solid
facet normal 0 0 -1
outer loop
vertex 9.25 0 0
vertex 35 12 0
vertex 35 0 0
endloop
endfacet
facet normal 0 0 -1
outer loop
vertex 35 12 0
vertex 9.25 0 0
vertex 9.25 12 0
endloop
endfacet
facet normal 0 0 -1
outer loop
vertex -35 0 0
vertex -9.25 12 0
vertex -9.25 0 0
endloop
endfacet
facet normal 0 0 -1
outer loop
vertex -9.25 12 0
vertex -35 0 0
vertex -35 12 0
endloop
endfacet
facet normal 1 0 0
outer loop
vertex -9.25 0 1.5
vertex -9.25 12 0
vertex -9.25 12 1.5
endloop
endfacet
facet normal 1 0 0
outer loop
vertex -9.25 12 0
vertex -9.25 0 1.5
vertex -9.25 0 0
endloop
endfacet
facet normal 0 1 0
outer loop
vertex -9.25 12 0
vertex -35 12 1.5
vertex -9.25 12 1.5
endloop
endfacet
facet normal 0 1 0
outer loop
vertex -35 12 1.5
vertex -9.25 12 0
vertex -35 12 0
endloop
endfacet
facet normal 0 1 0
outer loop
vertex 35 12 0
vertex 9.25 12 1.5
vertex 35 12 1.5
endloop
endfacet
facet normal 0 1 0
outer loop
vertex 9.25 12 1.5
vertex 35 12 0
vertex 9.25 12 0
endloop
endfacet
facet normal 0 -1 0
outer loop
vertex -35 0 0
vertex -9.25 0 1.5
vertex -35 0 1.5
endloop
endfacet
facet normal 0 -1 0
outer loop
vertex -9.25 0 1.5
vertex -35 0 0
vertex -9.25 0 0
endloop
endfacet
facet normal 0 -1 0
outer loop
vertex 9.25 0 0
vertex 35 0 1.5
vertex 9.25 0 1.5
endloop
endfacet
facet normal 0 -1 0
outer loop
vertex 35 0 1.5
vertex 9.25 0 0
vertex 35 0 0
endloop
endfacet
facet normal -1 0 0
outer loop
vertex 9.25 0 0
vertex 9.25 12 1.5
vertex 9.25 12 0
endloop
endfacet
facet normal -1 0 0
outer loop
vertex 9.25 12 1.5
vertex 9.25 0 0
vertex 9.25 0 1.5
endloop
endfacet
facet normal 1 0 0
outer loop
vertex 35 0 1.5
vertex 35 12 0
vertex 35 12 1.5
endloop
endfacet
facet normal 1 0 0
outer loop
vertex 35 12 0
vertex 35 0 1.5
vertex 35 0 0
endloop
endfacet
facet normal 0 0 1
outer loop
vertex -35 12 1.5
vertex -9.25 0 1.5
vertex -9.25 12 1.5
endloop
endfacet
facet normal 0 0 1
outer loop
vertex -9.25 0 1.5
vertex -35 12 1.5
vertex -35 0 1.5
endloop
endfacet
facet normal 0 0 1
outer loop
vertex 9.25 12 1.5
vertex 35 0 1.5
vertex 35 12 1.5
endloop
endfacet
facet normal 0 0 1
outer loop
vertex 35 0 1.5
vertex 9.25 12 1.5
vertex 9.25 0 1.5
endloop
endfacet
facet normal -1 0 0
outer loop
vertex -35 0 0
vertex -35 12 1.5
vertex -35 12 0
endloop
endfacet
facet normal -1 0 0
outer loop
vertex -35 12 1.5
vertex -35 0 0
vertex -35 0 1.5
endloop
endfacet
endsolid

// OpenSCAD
// 10-well comb for casting agarose gels
// Print orientation: flat on bed, teeth pointing down (-Z)

// ---------- Parameters ----------
plate_len    = 70;    // spine length (X)
plate_wid    = 12;    // spine width (Y)
plate_t      = 1.5;   // plate thickness (Z)

tooth_count  = 10;    // number of teeth
tooth_w      = 5.0;   // tooth width (X)
tooth_len    = 12;    // tooth length (Y)
tooth_pitch  = 1.5;   // gap between teeth (X)

eps          = 0.5;   // overcut for clean booleans

$fn = 64;

// ---------- Derived ----------
spine_h = plate_wid + tooth_count * tooth_len + (tooth_count - 1) * tooth_pitch;

// ---------- Model ----------
difference() {
    // Flat plate
    translate([-plate_len/2, 0, 0])
        cube([plate_len, plate_wid, plate_t]);

    // Teeth, centred on spine in X
    for (i = [0 : tooth_count - 1]) {
        x = (i - (tooth_count - 1)/2) * tooth_pitch;
        translate([x - tooth_w/2, 0, 0])
            cube([tooth_w, tooth_len, tooth_pitch + eps]);
    }
}
